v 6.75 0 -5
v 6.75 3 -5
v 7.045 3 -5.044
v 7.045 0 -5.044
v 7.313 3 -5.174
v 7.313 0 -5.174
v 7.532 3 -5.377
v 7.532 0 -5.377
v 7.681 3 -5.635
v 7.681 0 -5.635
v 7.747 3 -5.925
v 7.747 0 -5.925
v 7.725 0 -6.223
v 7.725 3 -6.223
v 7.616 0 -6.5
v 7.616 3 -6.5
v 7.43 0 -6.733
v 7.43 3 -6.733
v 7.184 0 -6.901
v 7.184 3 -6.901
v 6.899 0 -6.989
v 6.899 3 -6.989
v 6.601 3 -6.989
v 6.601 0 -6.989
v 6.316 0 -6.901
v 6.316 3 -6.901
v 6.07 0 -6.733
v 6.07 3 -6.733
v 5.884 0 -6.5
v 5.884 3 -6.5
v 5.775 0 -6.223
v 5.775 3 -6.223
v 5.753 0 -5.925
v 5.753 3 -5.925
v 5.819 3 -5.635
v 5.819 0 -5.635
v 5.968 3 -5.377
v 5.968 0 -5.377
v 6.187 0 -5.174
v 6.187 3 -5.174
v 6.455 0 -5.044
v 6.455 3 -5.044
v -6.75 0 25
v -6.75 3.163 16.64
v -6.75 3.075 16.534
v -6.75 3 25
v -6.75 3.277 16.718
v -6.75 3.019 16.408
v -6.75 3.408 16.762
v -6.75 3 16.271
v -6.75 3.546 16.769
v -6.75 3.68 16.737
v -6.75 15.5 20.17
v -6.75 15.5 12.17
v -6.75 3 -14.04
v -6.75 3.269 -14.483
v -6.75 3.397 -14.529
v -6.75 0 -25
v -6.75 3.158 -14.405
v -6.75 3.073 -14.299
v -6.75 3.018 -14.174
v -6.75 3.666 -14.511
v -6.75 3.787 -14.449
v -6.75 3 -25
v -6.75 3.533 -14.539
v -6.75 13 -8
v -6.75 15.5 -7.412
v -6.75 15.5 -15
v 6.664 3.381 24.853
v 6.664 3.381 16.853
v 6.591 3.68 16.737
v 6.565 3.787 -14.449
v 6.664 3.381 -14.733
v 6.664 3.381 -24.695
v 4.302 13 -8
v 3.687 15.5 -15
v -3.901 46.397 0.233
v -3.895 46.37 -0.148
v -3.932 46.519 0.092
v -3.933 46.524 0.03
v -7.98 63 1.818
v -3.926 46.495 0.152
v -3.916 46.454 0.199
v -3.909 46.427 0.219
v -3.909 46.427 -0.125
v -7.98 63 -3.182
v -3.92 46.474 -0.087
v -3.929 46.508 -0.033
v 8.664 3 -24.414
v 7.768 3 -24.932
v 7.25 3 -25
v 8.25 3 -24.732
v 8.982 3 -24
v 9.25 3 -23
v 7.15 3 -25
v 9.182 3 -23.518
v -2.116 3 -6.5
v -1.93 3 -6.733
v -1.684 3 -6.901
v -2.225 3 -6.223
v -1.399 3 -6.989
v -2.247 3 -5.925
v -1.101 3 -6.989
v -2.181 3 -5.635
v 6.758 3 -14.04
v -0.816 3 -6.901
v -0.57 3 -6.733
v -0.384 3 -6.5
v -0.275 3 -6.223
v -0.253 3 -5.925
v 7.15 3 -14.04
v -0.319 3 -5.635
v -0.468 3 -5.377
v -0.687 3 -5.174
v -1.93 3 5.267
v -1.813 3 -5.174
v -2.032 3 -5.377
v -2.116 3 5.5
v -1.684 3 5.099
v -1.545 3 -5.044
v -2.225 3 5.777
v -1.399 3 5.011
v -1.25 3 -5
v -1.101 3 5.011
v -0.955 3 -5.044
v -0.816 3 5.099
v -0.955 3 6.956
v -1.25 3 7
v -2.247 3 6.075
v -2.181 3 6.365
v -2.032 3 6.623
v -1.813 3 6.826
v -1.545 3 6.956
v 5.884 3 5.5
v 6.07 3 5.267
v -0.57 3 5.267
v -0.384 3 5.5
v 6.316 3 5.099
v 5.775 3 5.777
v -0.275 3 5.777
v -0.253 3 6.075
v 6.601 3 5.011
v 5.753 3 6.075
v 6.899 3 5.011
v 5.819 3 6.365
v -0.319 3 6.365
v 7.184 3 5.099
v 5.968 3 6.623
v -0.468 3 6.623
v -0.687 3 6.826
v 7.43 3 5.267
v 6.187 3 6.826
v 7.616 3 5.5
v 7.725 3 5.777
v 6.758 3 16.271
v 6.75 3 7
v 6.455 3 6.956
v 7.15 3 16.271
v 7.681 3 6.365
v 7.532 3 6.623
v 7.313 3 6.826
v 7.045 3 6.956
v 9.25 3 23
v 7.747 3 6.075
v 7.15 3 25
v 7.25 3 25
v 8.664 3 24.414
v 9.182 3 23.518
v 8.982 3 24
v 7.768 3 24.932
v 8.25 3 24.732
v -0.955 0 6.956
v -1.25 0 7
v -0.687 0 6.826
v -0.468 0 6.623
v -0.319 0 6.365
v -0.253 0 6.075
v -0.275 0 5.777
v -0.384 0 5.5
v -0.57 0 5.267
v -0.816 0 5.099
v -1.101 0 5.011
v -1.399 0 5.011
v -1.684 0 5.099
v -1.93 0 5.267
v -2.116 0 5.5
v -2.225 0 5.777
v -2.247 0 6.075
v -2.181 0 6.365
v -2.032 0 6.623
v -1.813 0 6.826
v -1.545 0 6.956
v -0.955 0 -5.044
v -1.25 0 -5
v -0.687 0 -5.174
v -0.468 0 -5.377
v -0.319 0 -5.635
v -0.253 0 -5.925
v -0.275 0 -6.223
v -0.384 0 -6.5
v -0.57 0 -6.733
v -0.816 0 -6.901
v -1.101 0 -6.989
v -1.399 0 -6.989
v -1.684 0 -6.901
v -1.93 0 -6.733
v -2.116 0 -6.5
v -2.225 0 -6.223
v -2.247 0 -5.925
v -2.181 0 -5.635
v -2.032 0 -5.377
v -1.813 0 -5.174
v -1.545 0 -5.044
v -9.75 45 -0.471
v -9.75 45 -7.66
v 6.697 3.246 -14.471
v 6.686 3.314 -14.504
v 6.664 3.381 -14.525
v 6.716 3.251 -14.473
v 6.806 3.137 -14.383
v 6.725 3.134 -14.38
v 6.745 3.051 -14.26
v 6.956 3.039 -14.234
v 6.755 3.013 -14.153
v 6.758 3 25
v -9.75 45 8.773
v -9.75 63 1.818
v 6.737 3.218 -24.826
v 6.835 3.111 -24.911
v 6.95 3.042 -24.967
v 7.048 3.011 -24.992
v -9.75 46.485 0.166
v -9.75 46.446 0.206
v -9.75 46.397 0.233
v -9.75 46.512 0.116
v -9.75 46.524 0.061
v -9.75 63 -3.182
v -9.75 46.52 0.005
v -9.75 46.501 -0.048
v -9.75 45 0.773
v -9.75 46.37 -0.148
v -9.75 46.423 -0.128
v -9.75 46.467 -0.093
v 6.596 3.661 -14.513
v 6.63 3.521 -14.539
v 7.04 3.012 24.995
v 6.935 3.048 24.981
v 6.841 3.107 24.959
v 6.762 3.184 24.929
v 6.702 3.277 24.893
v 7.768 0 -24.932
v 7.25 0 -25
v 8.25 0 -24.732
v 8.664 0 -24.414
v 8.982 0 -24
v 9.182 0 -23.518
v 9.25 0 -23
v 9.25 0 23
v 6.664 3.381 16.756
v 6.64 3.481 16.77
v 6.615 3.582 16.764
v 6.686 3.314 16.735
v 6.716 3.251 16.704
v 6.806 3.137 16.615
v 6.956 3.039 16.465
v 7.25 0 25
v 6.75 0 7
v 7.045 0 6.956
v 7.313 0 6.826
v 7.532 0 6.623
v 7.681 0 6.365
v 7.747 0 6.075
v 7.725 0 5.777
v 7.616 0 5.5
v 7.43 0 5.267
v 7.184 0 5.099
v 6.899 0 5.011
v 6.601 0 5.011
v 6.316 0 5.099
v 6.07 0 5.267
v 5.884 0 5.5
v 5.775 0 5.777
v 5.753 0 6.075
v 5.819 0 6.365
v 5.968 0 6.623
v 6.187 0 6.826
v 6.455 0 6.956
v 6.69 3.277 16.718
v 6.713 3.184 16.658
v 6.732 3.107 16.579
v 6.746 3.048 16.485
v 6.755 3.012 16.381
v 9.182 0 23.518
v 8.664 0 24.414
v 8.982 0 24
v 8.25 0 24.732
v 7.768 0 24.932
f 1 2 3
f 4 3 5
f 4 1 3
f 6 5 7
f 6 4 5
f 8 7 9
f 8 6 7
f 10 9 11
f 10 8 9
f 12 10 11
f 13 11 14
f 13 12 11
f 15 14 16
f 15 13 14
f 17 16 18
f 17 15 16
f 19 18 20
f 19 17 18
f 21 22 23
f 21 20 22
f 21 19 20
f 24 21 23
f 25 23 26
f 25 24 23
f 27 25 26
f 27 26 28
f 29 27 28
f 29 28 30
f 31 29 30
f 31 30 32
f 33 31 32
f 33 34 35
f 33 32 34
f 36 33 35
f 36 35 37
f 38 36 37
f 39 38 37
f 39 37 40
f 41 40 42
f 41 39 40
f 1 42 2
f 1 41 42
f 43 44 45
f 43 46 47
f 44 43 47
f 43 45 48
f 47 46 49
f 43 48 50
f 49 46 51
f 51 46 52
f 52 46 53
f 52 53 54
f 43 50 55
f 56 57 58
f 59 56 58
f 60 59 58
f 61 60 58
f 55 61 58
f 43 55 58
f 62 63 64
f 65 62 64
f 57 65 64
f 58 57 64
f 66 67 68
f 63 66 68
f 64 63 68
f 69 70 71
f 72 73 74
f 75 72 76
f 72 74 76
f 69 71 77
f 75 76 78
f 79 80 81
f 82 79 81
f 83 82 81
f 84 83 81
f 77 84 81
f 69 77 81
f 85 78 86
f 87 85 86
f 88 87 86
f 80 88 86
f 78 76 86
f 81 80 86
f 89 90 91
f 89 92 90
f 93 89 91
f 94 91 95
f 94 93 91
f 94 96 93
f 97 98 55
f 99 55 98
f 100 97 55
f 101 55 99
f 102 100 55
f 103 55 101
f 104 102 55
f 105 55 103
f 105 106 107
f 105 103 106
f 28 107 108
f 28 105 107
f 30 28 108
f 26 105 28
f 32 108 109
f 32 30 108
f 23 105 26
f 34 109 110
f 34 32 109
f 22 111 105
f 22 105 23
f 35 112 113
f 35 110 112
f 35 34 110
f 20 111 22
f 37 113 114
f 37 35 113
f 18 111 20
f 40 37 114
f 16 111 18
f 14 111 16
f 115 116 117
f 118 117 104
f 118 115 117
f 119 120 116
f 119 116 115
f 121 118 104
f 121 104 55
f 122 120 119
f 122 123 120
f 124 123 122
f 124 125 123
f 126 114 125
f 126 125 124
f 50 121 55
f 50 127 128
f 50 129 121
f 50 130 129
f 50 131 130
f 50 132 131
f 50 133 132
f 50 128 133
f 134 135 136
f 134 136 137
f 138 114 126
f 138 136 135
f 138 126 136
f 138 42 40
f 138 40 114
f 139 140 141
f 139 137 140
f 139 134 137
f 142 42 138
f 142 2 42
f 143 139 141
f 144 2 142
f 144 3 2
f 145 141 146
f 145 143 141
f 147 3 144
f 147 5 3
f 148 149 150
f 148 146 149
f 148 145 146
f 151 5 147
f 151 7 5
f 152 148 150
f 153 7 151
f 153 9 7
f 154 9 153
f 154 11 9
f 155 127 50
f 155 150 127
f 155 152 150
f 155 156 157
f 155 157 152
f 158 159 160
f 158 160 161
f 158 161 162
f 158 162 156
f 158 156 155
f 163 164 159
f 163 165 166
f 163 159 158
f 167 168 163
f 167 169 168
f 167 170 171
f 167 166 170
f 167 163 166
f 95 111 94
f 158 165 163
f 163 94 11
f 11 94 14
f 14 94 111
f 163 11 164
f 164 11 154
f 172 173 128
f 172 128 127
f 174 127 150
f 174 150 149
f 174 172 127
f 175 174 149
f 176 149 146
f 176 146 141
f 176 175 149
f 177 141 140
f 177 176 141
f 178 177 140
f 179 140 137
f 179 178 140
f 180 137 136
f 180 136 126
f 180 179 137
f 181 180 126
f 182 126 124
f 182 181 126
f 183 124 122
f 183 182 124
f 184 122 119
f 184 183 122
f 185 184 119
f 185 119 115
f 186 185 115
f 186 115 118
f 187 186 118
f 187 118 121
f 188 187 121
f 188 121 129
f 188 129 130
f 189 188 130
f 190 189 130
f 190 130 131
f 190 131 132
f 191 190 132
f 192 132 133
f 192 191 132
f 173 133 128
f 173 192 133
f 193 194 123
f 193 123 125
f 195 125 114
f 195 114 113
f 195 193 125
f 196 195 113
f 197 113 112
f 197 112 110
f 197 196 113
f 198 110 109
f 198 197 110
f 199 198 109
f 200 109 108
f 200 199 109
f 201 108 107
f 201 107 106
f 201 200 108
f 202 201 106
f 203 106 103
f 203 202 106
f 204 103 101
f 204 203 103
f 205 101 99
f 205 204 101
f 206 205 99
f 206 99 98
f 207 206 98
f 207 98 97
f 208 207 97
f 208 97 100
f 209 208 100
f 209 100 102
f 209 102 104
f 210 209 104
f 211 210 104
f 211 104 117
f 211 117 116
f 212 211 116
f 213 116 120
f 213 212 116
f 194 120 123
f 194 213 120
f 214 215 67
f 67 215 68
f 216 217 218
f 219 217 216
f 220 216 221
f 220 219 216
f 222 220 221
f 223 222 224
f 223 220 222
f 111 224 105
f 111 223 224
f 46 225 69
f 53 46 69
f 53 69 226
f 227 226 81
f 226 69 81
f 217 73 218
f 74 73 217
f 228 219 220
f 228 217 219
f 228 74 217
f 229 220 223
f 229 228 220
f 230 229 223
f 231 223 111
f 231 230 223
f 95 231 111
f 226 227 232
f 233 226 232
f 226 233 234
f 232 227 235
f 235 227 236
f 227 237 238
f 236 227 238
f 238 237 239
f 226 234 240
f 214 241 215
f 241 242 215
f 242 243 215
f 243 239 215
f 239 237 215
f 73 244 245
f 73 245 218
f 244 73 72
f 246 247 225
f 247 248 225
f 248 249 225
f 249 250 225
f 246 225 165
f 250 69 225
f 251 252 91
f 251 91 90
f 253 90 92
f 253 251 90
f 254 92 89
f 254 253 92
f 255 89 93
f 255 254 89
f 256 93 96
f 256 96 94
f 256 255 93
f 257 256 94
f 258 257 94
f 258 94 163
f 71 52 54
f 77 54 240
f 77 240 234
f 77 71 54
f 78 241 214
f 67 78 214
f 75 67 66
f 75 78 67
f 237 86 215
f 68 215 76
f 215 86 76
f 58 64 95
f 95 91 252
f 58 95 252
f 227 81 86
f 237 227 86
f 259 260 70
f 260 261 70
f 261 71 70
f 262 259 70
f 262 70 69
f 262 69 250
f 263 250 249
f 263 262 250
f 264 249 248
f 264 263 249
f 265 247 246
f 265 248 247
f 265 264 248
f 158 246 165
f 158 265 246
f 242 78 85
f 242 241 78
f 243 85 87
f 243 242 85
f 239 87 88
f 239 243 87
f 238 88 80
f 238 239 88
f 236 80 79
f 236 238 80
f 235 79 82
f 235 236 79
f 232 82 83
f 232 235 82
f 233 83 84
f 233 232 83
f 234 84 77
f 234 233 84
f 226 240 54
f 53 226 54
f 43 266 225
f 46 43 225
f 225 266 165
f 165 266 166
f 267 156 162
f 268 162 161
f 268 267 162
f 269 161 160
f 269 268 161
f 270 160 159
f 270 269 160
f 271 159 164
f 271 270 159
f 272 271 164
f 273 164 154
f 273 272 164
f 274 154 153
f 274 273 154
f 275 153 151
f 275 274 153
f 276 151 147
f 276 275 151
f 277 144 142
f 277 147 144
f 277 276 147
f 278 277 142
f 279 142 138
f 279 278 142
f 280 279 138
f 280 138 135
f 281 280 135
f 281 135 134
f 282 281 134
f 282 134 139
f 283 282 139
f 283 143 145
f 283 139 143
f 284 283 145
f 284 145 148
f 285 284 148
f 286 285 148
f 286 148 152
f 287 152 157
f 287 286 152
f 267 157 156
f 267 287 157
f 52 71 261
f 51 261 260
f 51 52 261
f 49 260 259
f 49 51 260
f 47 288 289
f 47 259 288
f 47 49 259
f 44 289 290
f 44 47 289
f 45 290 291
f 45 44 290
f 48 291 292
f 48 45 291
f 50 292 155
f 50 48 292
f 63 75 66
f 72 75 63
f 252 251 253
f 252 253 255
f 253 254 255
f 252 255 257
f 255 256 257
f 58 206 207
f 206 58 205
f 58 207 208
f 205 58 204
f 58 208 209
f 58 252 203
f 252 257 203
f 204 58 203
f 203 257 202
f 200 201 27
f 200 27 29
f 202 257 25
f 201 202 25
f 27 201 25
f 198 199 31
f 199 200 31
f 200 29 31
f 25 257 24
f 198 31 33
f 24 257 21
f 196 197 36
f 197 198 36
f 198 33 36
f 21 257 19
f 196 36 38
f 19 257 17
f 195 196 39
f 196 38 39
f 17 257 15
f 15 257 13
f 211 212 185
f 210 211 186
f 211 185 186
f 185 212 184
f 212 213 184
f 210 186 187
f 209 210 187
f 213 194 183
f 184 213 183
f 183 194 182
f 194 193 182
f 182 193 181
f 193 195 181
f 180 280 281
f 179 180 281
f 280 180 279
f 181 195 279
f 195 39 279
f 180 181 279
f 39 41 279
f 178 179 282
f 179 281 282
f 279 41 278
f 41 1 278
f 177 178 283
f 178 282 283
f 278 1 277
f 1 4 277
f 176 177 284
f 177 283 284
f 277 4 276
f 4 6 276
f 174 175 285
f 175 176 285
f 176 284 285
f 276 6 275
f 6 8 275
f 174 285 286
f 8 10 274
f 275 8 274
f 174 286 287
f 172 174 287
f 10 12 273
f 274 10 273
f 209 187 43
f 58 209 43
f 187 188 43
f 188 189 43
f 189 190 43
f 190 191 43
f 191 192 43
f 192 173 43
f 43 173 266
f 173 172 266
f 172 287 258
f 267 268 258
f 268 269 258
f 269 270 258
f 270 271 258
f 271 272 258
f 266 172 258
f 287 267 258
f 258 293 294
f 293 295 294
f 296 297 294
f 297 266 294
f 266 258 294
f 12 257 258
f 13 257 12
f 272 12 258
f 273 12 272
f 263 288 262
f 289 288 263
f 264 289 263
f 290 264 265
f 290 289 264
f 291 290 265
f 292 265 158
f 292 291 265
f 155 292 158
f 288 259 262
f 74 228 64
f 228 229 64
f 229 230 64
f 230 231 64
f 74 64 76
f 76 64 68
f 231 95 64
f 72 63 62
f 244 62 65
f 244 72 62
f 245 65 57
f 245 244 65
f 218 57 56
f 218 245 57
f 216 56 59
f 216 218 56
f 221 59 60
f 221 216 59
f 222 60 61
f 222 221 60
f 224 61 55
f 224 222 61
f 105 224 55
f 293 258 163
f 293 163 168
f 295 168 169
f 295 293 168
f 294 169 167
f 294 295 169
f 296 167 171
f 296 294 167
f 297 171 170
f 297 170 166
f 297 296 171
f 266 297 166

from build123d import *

# Parameters (mm, degrees)
SKETCH_1_R          = 1
EXTRUDE_1_DEPTH     = 3
SKETCH_2_W          = 16.007753667
SKETCH_2_H          = 50
EXTRUDE_2_DEPTH     = 80
CUT_EXTRUDE_1_DEPTH = 89.149011211
CUT_EXTRUDE_2_DEPTH = 81.960252593
EXTRUDE_3_DEPTH     = 3
CUT_EXTRUDE_3_DEPTH = 82.357621032
FILLET_1_R          = 0.5
FILLET_2_R          = 0.2


with BuildPart() as part:
    # 草图1 → 凸台-拉伸1 (new body)
    with BuildSketch(Plane(origin=(0, 0, 0), x_dir=(1, 0, 0), z_dir=(0, 1, 0))):
        with BuildLine():
            Line((-9.25, 25), (7.25, 25))
            ThreePointArc((7.25, 25), (8.664213562, 24.414213562), (9.25, 23))
            Line((9.25, 23), (9.25, -23))
            ThreePointArc((9.25, -23), (8.664213562, -24.414213562), (7.25, -25))
            Line((7.25, -25), (-9.25, -25))
            Line((-9.25, -25), (-9.25, 25))
        make_face()
        with Locations(Location((-1.25, 6, 0), (0, 0, 270))):
            Circle(SKETCH_1_R, mode=Mode.SUBTRACT)
        with Locations(Location((-1.25, -6, 0), (0, 0, 270))):
            Circle(SKETCH_1_R, mode=Mode.SUBTRACT)
        with Locations(Location((6.75, -6, 0), (0, 0, 270))):
            Circle(SKETCH_1_R, mode=Mode.SUBTRACT)
        with Locations(Location((6.75, 6, 0), (0, 0, 270))):
            Circle(SKETCH_1_R, mode=Mode.SUBTRACT)
    extrude(amount=EXTRUDE_1_DEPTH)

    # 草图2 → 凸台-拉伸2 (add)
    with BuildSketch(Plane(origin=(0, 3, 0), x_dir=(1, 0, 0), z_dir=(0, 1, 0))):
        with Locations((-1.246123166, 0)):
            Rectangle(SKETCH_2_W, SKETCH_2_H)
    extrude(amount=EXTRUDE_2_DEPTH)

    # 草图3 → 切除-拉伸1 (cut, through all)
    with BuildSketch(Plane(origin=(6.757753667, 0, 0), x_dir=(0, 0, -1), z_dir=(1, 0, 0))):
        Polygon((0, 47), (-17, 3), (15, 3), (8, 13), align=None)
        Polygon((25, 3), (15, 15.5), (3.181818182, 63), (-1.818181818, 63), (-25, 3), (-37.679958822, 3), (-37.679958822, 88.436899398), (63.328418147, 88.436899398), (63.328418147, 3), align=None)
    extrude(amount=-CUT_EXTRUDE_1_DEPTH, mode=Mode.SUBTRACT)

    # 草图4 → 切除-拉伸2 (cut, through all)
    with BuildSketch(Plane(origin=(0, 0, -25), x_dir=(-1, 0, 0), z_dir=(0, 0, -1))):
        Polygon((-6.757753667, 3), (8.40756476, 64.742116762), (-6.757753667, 64.742116762), align=None)
    extrude(amount=-CUT_EXTRUDE_2_DEPTH, mode=Mode.SUBTRACT)

    # 草图5 → 凸台-拉伸3 (add)
    with BuildSketch(Plane.ZY.offset(9.25)):
        Polygon((-3.181818182, 63), (-15, 15.5), (-25, 3), (-25, 0), (25, 0), (25, 3), (1.818181818, 63), align=None)
        Polygon((0, 47), (-8, 13), (-15, 3), (17, 3), align=None, mode=Mode.SUBTRACT)
    extrude(amount=EXTRUDE_3_DEPTH)

    # 草图6 → 切除-拉伸3 (cut, through all)
    with BuildSketch(Plane(origin=(0, 0, -25), x_dir=(-1, 0, 0), z_dir=(0, 0, -1))):
        Polygon((9.75, 65), (9.75, 45), (6.75, 15.5), (6.75, 0), (15.065136108, 0), (15.065136108, 65), align=None)
    extrude(amount=-CUT_EXTRUDE_3_DEPTH, mode=Mode.SUBTRACT)

    # 圆角1
    # the kernel refuses this fillet: 0.5 mm, written as the material it adds along each edge
    with BuildSketch(Plane(origin=(-6.75, 3, 17), x_dir=(0, 0, -1), z_dir=(1, 0, 0))) as fillet_1_piece_1_section:
        with BuildLine():
            CenterArc((FILLET_1_R * 1.45840694682, FILLET_1_R), FILLET_1_R, 158.875280854, 111.124719146)
            Line((FILLET_1_R * 0.525608812419, FILLET_1_R * 1.3603992792), (0, 0))
            Line((0, 0), (FILLET_1_R * 1.45840694682, 0))
        make_face()
    fillet_1_piece_1 = extrude(amount=15.33076235, mode=Mode.PRIVATE)
    fillet_1_piece_1 = split(fillet_1_piece_1, bisect_by=Plane(origin=(6.334852861, 4.721743663, 16.763347765), z_dir=(-0.9711342799096352, -0.23853345757858446, 0)), keep=Keep.TOP, mode=Mode.PRIVATE)
    add(fillet_1_piece_1)
    with BuildSketch(Plane(origin=(9.158573119, 3, -15), x_dir=(0, 0, 1), z_dir=(-1, 0, 0))) as fillet_1_piece_2_section:
        with BuildLine():
            CenterArc((FILLET_1_R * 1.92065556157, FILLET_1_R), FILLET_1_R, 145.007979801, 124.992020199)
            Line((FILLET_1_R * 1.10142364105, FILLET_1_R * 1.57346234436), (0, 0))
            Line((0, 0), (FILLET_1_R * 1.92065556157, 0))
        make_face()
    fillet_1_piece_2 = extrude(amount=15.908573119, mode=Mode.PRIVATE)
    fillet_1_piece_2 = split(fillet_1_piece_2, bisect_by=Plane(origin=(6.326718063, 4.754862629, -14.622728055), z_dir=(-0.9711342799096352, -0.23853345757858446, 0)), keep=Keep.TOP, mode=Mode.PRIVATE)
    add(fillet_1_piece_2)
    with BuildSketch(Plane(origin=(6.757753667, 3, 16.019874802), x_dir=(1, 0, 0), z_dir=(0, 0, 1))) as fillet_1_piece_3_section:
        with BuildLine():
            CenterArc((FILLET_1_R * 0.784100158108, FILLET_1_R), FILLET_1_R, 193.8, 76.2)
            Line((-FILLET_1_R * 0.187034121801, FILLET_1_R * 0.761466542421), (0, 0))
            Line((0, 0), (FILLET_1_R * 0.784100158108, 0))
        make_face()
    fillet_1_piece_3 = extrude(amount=8.980125198, mode=Mode.PRIVATE)
    fillet_1_piece_3 = split(fillet_1_piece_3, bisect_by=Plane(origin=(6.823760744, 4.428941995, 24.447908775), z_dir=(0, -0.3603992792021625, -0.9327981344055968)), keep=Keep.TOP, mode=Mode.PRIVATE)
    fillet_1_piece_3 = split(fillet_1_piece_3, bisect_by=Plane(origin=(6.823760744, 1.739503793, 17.487009898), z_dir=(0, 0.3603992792021626, 0.9327981344055968)), keep=Keep.TOP, mode=Mode.PRIVATE)
    add(fillet_1_piece_3)
    with BuildSketch(Plane(origin=(6.757753667, 3, -25), x_dir=(1, 0, 0), z_dir=(0, 0, 1))) as fillet_1_piece_4_section:
        with BuildLine():
            CenterArc((FILLET_1_R * 0.784100158108, FILLET_1_R), FILLET_1_R, 193.8, 76.2)
            Line((-FILLET_1_R * 0.187034121801, FILLET_1_R * 0.761466542421), (0, 0))
            Line((0, 0), (FILLET_1_R * 0.784100158108, 0))
        make_face()
    fillet_1_piece_4 = extrude(amount=10.980125198, mode=Mode.PRIVATE)
    fillet_1_piece_4 = split(fillet_1_piece_4, bisect_by=Plane(origin=(6.823819727, 5.521194882, -22.983044095), z_dir=(0, -0.6246950475544241, 0.7808688094430307)), keep=Keep.TOP, mode=Mode.PRIVATE)
    fillet_1_piece_4 = split(fillet_1_piece_4, bisect_by=Plane(origin=(6.823819727, 0.737200979, -16.583959315), z_dir=(0, 0.5734623443633279, -0.819231920519041)), keep=Keep.TOP, mode=Mode.PRIVATE)
    add(fillet_1_piece_4)
    with BuildSketch(Plane(origin=(-6.75, 3, 17), x_dir=(0, 0, -1), z_dir=(1, 0, 0))) as fillet_1_piece_5a_section:
        with BuildLine():
            CenterArc((FILLET_1_R * 1.45840694682, FILLET_1_R), FILLET_1_R, 158.875280854, 111.124719146)
            Line((FILLET_1_R * 0.525608812419, FILLET_1_R * 1.3603992792), (0, 0))
            Line((0, 0), (FILLET_1_R * 1.45840694682, 0))
        make_face()
    fillet_1_piece_5a = extrude(amount=15.33076235, mode=Mode.PRIVATE)
    fillet_1_piece_5a = split(fillet_1_piece_5a, bisect_by=Plane(origin=(6.770254608, 2.949105284, 16.764105763), z_dir=(0.9711342799096352, 0.23853345757858446, 0)), keep=Keep.TOP, mode=Mode.PRIVATE)
    with BuildSketch(Plane(origin=(6.757753667, 3, 16.019874802), x_dir=(1, 0, 0), z_dir=(0, 0, 1))) as fillet_1_piece_5b_section:
        with BuildLine():
            CenterArc((FILLET_1_R * 0.784100158108, FILLET_1_R), FILLET_1_R, 193.8, 76.2)
            Line((-FILLET_1_R * 0.187034121801, FILLET_1_R * 0.761466542421), (0, 0))
            Line((0, 0), (FILLET_1_R * 0.784100158108, 0))
        make_face()
    fillet_1_piece_5b = extrude(amount=8.980125198, mode=Mode.PRIVATE)
    fillet_1_piece_5b = split(fillet_1_piece_5b, bisect_by=Plane(origin=(6.826253209, 3.240744299, 16.906985157), z_dir=(0, -0.3603992792021626, -0.9327981344055968)), keep=Keep.TOP, mode=Mode.PRIVATE)
    fillet_1_piece_5 = fillet_1_piece_5a & fillet_1_piece_5b
    add(fillet_1_piece_5)
    with BuildSketch(Plane(origin=(6.757753667, 3, -25), x_dir=(1, 0, 0), z_dir=(0, 0, 1))) as fillet_1_piece_6a_section:
        with BuildLine():
            CenterArc((FILLET_1_R * 0.784100158108, FILLET_1_R), FILLET_1_R, 193.8, 76.2)
            Line((-FILLET_1_R * 0.187034121801, FILLET_1_R * 0.761466542421), (0, 0))
            Line((0, 0), (FILLET_1_R * 0.784100158108, 0))
        make_face()
    fillet_1_piece_6a = extrude(amount=10.980125198, mode=Mode.PRIVATE)
    fillet_1_piece_6a = split(fillet_1_piece_6a, bisect_by=Plane(origin=(6.828403151, 3.296038352, -14.792773154), z_dir=(0, -0.5734623443633279, 0.819231920519041)), keep=Keep.TOP, mode=Mode.PRIVATE)
    with BuildSketch(Plane(origin=(9.158573119, 3, -15), x_dir=(0, 0, 1), z_dir=(-1, 0, 0))) as fillet_1_piece_6b_section:
        with BuildLine():
            CenterArc((FILLET_1_R * 1.92065556157, FILLET_1_R), FILLET_1_R, 145.007979801, 124.992020199)
            Line((FILLET_1_R * 1.10142364105, FILLET_1_R * 1.57346234436), (0, 0))
            Line((0, 0), (FILLET_1_R * 1.92065556157, 0))
        make_face()
    fillet_1_piece_6b = extrude(amount=15.908573119, mode=Mode.PRIVATE)
    fillet_1_piece_6b = split(fillet_1_piece_6b, bisect_by=Plane(origin=(6.778509417, 2.915497721, -14.622764636), z_dir=(0.9711342799096352, 0.23853345757858446, 0)), keep=Keep.TOP, mode=Mode.PRIVATE)
    fillet_1_piece_6 = fillet_1_piece_6a & fillet_1_piece_6b
    add(fillet_1_piece_6)

    # 圆角2
    fillet_2_edges = [part.edges().sort_by_distance(p)[0] for p in [
        (-6.899841453, 47, 0),
    ]]
    fillet(fillet_2_edges, radius=FILLET_2_R)


solid = part.part
